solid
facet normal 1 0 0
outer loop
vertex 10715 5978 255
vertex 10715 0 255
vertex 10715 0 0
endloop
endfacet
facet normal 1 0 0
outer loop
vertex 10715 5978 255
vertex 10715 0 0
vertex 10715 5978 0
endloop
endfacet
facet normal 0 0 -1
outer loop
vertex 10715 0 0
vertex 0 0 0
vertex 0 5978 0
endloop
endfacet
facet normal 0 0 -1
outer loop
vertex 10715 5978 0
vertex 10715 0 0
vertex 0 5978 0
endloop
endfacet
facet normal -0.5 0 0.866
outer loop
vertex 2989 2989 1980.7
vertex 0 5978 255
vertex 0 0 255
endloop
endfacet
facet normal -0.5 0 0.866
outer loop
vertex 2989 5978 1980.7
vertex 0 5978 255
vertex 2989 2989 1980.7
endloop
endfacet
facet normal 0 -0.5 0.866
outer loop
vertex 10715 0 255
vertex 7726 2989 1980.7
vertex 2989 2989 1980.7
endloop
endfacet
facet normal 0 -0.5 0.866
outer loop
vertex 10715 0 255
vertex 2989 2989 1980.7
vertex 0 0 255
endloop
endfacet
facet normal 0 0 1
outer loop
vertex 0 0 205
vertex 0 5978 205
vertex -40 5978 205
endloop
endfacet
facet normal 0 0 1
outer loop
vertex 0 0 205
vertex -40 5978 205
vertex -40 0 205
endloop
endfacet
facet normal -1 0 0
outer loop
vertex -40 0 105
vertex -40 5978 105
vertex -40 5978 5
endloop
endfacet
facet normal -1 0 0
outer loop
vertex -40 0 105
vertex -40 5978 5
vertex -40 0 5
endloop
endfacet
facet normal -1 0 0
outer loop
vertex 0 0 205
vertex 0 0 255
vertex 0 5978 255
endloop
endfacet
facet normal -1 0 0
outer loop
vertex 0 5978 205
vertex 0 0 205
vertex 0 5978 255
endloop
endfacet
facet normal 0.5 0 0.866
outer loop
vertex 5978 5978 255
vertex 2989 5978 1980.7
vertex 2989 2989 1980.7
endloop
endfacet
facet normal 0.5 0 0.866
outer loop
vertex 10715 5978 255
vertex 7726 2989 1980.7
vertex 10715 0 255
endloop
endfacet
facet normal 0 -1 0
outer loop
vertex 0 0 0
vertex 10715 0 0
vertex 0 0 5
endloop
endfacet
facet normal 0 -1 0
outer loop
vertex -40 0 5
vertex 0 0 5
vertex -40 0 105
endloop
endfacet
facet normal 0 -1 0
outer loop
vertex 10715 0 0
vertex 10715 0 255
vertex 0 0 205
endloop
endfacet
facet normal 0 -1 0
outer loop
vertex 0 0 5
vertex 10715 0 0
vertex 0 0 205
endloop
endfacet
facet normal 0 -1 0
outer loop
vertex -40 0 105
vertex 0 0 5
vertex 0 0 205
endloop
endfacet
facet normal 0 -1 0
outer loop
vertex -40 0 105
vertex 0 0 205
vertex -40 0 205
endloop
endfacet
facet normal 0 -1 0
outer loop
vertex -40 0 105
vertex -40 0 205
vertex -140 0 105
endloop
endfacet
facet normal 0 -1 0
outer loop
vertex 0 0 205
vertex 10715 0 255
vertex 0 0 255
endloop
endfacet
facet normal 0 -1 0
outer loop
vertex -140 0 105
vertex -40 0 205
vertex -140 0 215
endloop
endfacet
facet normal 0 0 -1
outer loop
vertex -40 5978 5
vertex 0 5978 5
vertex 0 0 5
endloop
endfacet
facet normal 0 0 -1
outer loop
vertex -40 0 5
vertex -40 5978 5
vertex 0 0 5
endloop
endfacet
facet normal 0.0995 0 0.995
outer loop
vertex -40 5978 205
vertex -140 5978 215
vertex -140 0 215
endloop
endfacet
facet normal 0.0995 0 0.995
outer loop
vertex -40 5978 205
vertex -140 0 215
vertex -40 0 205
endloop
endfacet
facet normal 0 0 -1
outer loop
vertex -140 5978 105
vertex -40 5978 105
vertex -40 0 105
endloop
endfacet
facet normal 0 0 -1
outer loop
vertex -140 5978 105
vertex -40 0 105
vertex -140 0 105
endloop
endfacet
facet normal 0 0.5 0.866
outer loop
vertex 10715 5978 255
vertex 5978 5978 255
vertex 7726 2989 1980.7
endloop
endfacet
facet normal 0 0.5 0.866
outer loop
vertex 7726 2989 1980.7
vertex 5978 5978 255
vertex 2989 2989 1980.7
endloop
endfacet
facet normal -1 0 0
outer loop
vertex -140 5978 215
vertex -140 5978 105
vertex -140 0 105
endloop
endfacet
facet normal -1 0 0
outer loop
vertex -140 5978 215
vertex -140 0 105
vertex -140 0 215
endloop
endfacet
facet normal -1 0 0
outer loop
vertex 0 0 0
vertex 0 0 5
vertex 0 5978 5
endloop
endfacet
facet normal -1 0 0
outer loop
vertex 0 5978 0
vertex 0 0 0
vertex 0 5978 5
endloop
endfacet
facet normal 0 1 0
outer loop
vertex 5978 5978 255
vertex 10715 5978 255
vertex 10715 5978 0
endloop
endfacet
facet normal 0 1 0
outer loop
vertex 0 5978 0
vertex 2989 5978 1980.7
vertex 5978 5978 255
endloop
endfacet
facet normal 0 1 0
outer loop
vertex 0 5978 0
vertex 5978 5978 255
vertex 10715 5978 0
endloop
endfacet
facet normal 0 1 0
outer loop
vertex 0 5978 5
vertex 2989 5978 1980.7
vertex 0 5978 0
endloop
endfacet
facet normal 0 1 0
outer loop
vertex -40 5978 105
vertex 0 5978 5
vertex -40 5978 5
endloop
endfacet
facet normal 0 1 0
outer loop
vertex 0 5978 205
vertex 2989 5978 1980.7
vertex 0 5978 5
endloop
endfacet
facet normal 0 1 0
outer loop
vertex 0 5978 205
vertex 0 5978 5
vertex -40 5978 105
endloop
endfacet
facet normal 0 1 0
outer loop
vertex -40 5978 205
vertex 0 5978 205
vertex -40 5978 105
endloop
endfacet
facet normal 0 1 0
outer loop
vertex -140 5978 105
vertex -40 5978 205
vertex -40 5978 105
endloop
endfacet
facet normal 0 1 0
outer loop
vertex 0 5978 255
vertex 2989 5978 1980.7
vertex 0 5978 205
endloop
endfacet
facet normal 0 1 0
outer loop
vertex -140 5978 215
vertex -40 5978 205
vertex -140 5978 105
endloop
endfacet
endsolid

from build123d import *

# Parameters (mm, degrees)
F1_DEPTH = 10715
F3_DEPTH = 5978.001
F6_W     = 5978
F6_H     = 200
F7_DEPTH = 40
F9_DEPTH = 5978


with BuildPart() as f1:
    # F0 (on Right) → F1 (new body)
    with BuildSketch(Plane.YZ):
        Polygon((0, 255), (0, 0), (5978, 0), (5978, 255), (2989, 1980.6999546078), align=None)
    extrude(amount=F1_DEPTH)

    # F2 (on Front) → F3 (cut, through all)
    with BuildSketch(Plane.XZ):
        Polygon((0, 1980.6999546078), (0, 255), (2989, 1980.6999546078), align=None)
        Polygon((7726, 1980.6999546078), (10715, 255), (10715, 1980.6999546078), align=None)
    extrude(amount=-F3_DEPTH, mode=Mode.SUBTRACT)

    # F4 (on face) → F5 (join, up to the next surface of F1)
    with BuildSketch(Plane(origin=(0, 5978, 0), x_dir=(-1, 0, 0), z_dir=(0, 1, 0))):
        Polygon((-5978, 255), (0, 255), (-2989, 1980.6999546078), align=None)
    extrude(until=Until.NEXT, dir=(0, -1, 0))

    # F6 (on face) → F7 (join)
    with BuildSketch(Plane(origin=(0, 0, 0), x_dir=(0, -1, 0), z_dir=(-1, 0, 0))):
        with Locations((-2989, 105)):
            Rectangle(F6_W, F6_H)
    extrude(amount=F7_DEPTH)

    # F8 (on face) → F9 (join, through all)
    with BuildSketch(Plane(origin=(0, 5978, 0), x_dir=(-1, 0, 0), z_dir=(0, 1, 0))):
        Polygon((140, 215), (40, 205), (40, 105), (140, 105), align=None)
    extrude(amount=-F9_DEPTH)


solid = f1.part
